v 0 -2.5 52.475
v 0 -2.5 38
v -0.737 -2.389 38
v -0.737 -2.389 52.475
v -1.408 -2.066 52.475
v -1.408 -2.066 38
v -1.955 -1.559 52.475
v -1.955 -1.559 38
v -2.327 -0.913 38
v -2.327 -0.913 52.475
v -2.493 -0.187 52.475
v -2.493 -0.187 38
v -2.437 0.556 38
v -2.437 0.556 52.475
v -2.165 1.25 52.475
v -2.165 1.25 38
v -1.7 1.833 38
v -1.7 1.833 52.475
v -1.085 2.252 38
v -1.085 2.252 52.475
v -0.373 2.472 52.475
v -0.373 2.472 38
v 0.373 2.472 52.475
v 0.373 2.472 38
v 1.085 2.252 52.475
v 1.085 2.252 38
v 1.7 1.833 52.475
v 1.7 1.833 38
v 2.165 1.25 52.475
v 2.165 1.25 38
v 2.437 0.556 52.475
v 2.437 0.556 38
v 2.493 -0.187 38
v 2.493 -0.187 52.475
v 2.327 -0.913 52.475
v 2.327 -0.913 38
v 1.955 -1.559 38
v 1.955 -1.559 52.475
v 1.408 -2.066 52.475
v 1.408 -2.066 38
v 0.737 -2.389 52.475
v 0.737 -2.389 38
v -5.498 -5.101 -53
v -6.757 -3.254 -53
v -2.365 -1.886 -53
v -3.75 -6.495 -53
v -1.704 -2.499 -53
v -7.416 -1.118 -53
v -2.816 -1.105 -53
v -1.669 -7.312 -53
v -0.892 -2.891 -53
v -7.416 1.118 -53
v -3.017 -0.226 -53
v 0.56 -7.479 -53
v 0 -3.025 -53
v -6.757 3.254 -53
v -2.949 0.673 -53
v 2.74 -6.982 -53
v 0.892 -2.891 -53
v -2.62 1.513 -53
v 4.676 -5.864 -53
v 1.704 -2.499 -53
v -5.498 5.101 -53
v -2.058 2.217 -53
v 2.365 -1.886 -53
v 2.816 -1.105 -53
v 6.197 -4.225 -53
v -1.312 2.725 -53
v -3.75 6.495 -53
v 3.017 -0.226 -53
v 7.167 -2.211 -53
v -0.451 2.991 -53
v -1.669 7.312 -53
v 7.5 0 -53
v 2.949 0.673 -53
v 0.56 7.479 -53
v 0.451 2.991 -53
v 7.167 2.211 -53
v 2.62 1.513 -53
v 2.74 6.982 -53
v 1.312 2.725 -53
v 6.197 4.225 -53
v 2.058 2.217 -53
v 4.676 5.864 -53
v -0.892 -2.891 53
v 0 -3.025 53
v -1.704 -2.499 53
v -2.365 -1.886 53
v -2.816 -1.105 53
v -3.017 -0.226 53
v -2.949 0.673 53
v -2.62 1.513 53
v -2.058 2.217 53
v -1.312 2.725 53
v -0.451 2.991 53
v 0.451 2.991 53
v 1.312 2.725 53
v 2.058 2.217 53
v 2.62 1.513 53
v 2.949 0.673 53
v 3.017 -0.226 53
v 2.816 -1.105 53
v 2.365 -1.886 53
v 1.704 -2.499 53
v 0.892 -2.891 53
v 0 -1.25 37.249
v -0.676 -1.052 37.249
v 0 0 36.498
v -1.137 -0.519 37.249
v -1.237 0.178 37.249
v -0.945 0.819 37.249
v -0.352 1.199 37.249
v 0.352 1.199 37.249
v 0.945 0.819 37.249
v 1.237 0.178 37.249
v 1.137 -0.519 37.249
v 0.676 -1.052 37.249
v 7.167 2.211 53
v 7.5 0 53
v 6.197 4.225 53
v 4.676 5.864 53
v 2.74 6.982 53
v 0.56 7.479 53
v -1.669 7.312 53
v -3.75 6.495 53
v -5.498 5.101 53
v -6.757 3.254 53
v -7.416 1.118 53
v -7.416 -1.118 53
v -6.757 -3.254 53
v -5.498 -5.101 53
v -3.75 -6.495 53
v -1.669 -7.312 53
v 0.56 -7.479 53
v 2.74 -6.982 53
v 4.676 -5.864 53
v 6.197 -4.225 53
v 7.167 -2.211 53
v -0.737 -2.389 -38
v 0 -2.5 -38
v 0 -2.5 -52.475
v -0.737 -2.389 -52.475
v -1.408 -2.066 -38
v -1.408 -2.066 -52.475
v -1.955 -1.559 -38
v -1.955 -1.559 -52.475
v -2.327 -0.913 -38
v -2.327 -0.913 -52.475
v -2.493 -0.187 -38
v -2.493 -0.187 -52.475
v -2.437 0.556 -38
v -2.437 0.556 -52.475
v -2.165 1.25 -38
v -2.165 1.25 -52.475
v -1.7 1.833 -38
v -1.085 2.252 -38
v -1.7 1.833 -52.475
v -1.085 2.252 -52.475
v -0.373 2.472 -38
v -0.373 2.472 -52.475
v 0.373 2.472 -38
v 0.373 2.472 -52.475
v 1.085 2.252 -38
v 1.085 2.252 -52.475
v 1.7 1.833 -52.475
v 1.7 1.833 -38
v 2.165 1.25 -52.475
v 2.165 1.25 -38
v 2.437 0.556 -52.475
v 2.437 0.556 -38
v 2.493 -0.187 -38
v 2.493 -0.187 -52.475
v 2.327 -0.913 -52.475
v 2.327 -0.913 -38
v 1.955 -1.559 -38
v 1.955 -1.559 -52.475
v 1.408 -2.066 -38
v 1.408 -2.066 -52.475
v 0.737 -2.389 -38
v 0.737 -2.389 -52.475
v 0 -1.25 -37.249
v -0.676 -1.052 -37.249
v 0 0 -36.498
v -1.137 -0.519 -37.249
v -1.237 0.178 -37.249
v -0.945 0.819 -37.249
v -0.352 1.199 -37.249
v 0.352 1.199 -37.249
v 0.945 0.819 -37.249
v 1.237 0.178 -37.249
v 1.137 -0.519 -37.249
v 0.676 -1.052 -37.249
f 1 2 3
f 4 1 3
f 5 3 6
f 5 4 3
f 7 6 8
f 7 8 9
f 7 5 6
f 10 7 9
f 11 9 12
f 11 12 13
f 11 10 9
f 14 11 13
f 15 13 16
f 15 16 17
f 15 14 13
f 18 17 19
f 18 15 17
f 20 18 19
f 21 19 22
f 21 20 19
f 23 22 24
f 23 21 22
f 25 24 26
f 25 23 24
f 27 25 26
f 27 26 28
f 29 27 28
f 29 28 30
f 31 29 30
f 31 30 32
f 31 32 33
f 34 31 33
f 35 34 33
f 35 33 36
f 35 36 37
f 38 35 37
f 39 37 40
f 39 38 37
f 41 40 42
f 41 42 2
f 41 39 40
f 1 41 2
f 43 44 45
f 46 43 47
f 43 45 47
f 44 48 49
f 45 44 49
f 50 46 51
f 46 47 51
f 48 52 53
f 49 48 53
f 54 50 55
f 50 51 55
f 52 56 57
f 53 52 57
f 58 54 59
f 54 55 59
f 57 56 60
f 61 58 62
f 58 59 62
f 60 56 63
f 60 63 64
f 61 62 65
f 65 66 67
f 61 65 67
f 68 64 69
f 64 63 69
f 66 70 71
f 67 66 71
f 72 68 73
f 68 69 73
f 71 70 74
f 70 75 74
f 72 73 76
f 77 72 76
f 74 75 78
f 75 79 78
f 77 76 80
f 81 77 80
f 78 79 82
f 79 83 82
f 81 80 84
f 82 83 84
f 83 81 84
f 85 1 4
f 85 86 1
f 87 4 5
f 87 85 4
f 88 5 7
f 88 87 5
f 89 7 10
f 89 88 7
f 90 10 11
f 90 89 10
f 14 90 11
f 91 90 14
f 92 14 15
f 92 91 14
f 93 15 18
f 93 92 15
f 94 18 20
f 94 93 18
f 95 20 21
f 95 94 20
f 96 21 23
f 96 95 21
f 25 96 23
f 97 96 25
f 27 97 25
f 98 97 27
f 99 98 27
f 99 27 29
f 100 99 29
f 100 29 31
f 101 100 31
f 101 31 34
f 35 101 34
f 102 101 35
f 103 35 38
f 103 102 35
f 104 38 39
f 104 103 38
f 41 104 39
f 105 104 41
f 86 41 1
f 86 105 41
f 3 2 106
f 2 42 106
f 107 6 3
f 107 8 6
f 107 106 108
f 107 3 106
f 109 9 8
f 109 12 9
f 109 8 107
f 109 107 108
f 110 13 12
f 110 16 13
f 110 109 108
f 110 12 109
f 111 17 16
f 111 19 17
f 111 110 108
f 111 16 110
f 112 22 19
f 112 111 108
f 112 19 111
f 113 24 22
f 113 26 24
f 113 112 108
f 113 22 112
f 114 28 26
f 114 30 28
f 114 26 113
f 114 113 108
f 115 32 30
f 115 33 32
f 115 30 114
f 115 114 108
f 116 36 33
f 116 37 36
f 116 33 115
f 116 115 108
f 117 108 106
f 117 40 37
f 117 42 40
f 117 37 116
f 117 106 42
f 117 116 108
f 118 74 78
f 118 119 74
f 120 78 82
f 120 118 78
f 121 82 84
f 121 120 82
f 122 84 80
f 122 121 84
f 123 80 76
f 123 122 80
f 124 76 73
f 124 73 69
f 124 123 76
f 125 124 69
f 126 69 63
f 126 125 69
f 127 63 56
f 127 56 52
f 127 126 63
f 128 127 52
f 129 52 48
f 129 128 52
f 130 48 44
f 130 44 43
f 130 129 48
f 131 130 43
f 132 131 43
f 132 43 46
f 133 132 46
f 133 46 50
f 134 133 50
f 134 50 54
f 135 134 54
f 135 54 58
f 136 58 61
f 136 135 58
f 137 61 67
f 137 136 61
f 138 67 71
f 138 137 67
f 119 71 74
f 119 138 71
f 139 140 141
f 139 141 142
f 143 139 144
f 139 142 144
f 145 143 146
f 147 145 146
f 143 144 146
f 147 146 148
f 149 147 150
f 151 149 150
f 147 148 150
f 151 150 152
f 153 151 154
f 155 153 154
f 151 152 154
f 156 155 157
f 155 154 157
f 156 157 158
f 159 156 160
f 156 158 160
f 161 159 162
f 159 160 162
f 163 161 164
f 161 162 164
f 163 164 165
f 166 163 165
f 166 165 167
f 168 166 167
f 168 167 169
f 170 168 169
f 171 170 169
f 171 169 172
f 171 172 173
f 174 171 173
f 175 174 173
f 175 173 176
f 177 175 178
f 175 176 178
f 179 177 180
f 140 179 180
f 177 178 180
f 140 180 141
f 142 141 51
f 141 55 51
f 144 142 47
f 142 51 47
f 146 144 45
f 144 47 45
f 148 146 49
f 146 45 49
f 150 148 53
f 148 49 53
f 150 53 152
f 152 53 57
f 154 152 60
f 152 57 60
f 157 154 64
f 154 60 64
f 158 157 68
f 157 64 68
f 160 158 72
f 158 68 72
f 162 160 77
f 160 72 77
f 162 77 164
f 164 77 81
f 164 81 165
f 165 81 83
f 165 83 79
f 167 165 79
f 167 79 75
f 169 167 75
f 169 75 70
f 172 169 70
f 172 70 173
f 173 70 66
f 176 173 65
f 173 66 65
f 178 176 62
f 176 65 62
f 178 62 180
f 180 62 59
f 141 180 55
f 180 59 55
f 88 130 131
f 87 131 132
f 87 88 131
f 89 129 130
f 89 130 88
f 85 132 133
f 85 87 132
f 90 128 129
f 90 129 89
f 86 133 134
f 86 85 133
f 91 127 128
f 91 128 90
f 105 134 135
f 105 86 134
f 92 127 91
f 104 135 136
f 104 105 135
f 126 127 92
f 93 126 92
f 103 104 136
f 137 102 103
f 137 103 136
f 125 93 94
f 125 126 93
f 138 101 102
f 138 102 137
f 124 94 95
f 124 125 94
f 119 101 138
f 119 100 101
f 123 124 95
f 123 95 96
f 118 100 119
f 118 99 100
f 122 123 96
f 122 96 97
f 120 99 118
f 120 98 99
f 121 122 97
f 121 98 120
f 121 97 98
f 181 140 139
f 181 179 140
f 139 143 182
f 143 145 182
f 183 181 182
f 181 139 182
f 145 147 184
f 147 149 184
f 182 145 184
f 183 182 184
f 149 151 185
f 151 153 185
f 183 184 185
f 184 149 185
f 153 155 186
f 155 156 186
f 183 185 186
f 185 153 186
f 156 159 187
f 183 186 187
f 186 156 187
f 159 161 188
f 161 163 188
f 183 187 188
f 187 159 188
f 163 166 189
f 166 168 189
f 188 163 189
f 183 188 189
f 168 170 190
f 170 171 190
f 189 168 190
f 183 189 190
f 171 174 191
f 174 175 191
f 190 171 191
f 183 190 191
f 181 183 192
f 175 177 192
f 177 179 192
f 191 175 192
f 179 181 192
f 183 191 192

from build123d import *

# Parameters (mm, degrees)
SKETCH1_R           = 7.5
BOSS_EXTRUDE1_DEPTH = 53


with BuildPart() as part:
    # Sketch1 → Boss-Extrude1 (new body, symmetric)
    with BuildSketch(Plane.XY):
        Circle(SKETCH1_R)
    extrude(amount=BOSS_EXTRUDE1_DEPTH, both=True)

    # Sketch3 → M6x1.0 Tapped Hole1 (revolve, cut)
    with BuildSketch(Plane(origin=(0, 0, 53), x_dir=(0, -1, 0), z_dir=(1, 0, 0))):
        Polygon((0, 0), (0, 16.502151548), (2.5, 15), (2.5, 0.525), (3.025, 0), align=None)
    m6x1_0_tapped_hole1 = revolve(axis=Axis((0, 0, 59.35), (0, 0, -1)), mode=Mode.SUBTRACT)

    # Mirror1: M6x1.0 Tapped Hole1 across plane
    add(m6x1_0_tapped_hole1.mirror(Plane.XY), mode=Mode.SUBTRACT)


solid = part.part
